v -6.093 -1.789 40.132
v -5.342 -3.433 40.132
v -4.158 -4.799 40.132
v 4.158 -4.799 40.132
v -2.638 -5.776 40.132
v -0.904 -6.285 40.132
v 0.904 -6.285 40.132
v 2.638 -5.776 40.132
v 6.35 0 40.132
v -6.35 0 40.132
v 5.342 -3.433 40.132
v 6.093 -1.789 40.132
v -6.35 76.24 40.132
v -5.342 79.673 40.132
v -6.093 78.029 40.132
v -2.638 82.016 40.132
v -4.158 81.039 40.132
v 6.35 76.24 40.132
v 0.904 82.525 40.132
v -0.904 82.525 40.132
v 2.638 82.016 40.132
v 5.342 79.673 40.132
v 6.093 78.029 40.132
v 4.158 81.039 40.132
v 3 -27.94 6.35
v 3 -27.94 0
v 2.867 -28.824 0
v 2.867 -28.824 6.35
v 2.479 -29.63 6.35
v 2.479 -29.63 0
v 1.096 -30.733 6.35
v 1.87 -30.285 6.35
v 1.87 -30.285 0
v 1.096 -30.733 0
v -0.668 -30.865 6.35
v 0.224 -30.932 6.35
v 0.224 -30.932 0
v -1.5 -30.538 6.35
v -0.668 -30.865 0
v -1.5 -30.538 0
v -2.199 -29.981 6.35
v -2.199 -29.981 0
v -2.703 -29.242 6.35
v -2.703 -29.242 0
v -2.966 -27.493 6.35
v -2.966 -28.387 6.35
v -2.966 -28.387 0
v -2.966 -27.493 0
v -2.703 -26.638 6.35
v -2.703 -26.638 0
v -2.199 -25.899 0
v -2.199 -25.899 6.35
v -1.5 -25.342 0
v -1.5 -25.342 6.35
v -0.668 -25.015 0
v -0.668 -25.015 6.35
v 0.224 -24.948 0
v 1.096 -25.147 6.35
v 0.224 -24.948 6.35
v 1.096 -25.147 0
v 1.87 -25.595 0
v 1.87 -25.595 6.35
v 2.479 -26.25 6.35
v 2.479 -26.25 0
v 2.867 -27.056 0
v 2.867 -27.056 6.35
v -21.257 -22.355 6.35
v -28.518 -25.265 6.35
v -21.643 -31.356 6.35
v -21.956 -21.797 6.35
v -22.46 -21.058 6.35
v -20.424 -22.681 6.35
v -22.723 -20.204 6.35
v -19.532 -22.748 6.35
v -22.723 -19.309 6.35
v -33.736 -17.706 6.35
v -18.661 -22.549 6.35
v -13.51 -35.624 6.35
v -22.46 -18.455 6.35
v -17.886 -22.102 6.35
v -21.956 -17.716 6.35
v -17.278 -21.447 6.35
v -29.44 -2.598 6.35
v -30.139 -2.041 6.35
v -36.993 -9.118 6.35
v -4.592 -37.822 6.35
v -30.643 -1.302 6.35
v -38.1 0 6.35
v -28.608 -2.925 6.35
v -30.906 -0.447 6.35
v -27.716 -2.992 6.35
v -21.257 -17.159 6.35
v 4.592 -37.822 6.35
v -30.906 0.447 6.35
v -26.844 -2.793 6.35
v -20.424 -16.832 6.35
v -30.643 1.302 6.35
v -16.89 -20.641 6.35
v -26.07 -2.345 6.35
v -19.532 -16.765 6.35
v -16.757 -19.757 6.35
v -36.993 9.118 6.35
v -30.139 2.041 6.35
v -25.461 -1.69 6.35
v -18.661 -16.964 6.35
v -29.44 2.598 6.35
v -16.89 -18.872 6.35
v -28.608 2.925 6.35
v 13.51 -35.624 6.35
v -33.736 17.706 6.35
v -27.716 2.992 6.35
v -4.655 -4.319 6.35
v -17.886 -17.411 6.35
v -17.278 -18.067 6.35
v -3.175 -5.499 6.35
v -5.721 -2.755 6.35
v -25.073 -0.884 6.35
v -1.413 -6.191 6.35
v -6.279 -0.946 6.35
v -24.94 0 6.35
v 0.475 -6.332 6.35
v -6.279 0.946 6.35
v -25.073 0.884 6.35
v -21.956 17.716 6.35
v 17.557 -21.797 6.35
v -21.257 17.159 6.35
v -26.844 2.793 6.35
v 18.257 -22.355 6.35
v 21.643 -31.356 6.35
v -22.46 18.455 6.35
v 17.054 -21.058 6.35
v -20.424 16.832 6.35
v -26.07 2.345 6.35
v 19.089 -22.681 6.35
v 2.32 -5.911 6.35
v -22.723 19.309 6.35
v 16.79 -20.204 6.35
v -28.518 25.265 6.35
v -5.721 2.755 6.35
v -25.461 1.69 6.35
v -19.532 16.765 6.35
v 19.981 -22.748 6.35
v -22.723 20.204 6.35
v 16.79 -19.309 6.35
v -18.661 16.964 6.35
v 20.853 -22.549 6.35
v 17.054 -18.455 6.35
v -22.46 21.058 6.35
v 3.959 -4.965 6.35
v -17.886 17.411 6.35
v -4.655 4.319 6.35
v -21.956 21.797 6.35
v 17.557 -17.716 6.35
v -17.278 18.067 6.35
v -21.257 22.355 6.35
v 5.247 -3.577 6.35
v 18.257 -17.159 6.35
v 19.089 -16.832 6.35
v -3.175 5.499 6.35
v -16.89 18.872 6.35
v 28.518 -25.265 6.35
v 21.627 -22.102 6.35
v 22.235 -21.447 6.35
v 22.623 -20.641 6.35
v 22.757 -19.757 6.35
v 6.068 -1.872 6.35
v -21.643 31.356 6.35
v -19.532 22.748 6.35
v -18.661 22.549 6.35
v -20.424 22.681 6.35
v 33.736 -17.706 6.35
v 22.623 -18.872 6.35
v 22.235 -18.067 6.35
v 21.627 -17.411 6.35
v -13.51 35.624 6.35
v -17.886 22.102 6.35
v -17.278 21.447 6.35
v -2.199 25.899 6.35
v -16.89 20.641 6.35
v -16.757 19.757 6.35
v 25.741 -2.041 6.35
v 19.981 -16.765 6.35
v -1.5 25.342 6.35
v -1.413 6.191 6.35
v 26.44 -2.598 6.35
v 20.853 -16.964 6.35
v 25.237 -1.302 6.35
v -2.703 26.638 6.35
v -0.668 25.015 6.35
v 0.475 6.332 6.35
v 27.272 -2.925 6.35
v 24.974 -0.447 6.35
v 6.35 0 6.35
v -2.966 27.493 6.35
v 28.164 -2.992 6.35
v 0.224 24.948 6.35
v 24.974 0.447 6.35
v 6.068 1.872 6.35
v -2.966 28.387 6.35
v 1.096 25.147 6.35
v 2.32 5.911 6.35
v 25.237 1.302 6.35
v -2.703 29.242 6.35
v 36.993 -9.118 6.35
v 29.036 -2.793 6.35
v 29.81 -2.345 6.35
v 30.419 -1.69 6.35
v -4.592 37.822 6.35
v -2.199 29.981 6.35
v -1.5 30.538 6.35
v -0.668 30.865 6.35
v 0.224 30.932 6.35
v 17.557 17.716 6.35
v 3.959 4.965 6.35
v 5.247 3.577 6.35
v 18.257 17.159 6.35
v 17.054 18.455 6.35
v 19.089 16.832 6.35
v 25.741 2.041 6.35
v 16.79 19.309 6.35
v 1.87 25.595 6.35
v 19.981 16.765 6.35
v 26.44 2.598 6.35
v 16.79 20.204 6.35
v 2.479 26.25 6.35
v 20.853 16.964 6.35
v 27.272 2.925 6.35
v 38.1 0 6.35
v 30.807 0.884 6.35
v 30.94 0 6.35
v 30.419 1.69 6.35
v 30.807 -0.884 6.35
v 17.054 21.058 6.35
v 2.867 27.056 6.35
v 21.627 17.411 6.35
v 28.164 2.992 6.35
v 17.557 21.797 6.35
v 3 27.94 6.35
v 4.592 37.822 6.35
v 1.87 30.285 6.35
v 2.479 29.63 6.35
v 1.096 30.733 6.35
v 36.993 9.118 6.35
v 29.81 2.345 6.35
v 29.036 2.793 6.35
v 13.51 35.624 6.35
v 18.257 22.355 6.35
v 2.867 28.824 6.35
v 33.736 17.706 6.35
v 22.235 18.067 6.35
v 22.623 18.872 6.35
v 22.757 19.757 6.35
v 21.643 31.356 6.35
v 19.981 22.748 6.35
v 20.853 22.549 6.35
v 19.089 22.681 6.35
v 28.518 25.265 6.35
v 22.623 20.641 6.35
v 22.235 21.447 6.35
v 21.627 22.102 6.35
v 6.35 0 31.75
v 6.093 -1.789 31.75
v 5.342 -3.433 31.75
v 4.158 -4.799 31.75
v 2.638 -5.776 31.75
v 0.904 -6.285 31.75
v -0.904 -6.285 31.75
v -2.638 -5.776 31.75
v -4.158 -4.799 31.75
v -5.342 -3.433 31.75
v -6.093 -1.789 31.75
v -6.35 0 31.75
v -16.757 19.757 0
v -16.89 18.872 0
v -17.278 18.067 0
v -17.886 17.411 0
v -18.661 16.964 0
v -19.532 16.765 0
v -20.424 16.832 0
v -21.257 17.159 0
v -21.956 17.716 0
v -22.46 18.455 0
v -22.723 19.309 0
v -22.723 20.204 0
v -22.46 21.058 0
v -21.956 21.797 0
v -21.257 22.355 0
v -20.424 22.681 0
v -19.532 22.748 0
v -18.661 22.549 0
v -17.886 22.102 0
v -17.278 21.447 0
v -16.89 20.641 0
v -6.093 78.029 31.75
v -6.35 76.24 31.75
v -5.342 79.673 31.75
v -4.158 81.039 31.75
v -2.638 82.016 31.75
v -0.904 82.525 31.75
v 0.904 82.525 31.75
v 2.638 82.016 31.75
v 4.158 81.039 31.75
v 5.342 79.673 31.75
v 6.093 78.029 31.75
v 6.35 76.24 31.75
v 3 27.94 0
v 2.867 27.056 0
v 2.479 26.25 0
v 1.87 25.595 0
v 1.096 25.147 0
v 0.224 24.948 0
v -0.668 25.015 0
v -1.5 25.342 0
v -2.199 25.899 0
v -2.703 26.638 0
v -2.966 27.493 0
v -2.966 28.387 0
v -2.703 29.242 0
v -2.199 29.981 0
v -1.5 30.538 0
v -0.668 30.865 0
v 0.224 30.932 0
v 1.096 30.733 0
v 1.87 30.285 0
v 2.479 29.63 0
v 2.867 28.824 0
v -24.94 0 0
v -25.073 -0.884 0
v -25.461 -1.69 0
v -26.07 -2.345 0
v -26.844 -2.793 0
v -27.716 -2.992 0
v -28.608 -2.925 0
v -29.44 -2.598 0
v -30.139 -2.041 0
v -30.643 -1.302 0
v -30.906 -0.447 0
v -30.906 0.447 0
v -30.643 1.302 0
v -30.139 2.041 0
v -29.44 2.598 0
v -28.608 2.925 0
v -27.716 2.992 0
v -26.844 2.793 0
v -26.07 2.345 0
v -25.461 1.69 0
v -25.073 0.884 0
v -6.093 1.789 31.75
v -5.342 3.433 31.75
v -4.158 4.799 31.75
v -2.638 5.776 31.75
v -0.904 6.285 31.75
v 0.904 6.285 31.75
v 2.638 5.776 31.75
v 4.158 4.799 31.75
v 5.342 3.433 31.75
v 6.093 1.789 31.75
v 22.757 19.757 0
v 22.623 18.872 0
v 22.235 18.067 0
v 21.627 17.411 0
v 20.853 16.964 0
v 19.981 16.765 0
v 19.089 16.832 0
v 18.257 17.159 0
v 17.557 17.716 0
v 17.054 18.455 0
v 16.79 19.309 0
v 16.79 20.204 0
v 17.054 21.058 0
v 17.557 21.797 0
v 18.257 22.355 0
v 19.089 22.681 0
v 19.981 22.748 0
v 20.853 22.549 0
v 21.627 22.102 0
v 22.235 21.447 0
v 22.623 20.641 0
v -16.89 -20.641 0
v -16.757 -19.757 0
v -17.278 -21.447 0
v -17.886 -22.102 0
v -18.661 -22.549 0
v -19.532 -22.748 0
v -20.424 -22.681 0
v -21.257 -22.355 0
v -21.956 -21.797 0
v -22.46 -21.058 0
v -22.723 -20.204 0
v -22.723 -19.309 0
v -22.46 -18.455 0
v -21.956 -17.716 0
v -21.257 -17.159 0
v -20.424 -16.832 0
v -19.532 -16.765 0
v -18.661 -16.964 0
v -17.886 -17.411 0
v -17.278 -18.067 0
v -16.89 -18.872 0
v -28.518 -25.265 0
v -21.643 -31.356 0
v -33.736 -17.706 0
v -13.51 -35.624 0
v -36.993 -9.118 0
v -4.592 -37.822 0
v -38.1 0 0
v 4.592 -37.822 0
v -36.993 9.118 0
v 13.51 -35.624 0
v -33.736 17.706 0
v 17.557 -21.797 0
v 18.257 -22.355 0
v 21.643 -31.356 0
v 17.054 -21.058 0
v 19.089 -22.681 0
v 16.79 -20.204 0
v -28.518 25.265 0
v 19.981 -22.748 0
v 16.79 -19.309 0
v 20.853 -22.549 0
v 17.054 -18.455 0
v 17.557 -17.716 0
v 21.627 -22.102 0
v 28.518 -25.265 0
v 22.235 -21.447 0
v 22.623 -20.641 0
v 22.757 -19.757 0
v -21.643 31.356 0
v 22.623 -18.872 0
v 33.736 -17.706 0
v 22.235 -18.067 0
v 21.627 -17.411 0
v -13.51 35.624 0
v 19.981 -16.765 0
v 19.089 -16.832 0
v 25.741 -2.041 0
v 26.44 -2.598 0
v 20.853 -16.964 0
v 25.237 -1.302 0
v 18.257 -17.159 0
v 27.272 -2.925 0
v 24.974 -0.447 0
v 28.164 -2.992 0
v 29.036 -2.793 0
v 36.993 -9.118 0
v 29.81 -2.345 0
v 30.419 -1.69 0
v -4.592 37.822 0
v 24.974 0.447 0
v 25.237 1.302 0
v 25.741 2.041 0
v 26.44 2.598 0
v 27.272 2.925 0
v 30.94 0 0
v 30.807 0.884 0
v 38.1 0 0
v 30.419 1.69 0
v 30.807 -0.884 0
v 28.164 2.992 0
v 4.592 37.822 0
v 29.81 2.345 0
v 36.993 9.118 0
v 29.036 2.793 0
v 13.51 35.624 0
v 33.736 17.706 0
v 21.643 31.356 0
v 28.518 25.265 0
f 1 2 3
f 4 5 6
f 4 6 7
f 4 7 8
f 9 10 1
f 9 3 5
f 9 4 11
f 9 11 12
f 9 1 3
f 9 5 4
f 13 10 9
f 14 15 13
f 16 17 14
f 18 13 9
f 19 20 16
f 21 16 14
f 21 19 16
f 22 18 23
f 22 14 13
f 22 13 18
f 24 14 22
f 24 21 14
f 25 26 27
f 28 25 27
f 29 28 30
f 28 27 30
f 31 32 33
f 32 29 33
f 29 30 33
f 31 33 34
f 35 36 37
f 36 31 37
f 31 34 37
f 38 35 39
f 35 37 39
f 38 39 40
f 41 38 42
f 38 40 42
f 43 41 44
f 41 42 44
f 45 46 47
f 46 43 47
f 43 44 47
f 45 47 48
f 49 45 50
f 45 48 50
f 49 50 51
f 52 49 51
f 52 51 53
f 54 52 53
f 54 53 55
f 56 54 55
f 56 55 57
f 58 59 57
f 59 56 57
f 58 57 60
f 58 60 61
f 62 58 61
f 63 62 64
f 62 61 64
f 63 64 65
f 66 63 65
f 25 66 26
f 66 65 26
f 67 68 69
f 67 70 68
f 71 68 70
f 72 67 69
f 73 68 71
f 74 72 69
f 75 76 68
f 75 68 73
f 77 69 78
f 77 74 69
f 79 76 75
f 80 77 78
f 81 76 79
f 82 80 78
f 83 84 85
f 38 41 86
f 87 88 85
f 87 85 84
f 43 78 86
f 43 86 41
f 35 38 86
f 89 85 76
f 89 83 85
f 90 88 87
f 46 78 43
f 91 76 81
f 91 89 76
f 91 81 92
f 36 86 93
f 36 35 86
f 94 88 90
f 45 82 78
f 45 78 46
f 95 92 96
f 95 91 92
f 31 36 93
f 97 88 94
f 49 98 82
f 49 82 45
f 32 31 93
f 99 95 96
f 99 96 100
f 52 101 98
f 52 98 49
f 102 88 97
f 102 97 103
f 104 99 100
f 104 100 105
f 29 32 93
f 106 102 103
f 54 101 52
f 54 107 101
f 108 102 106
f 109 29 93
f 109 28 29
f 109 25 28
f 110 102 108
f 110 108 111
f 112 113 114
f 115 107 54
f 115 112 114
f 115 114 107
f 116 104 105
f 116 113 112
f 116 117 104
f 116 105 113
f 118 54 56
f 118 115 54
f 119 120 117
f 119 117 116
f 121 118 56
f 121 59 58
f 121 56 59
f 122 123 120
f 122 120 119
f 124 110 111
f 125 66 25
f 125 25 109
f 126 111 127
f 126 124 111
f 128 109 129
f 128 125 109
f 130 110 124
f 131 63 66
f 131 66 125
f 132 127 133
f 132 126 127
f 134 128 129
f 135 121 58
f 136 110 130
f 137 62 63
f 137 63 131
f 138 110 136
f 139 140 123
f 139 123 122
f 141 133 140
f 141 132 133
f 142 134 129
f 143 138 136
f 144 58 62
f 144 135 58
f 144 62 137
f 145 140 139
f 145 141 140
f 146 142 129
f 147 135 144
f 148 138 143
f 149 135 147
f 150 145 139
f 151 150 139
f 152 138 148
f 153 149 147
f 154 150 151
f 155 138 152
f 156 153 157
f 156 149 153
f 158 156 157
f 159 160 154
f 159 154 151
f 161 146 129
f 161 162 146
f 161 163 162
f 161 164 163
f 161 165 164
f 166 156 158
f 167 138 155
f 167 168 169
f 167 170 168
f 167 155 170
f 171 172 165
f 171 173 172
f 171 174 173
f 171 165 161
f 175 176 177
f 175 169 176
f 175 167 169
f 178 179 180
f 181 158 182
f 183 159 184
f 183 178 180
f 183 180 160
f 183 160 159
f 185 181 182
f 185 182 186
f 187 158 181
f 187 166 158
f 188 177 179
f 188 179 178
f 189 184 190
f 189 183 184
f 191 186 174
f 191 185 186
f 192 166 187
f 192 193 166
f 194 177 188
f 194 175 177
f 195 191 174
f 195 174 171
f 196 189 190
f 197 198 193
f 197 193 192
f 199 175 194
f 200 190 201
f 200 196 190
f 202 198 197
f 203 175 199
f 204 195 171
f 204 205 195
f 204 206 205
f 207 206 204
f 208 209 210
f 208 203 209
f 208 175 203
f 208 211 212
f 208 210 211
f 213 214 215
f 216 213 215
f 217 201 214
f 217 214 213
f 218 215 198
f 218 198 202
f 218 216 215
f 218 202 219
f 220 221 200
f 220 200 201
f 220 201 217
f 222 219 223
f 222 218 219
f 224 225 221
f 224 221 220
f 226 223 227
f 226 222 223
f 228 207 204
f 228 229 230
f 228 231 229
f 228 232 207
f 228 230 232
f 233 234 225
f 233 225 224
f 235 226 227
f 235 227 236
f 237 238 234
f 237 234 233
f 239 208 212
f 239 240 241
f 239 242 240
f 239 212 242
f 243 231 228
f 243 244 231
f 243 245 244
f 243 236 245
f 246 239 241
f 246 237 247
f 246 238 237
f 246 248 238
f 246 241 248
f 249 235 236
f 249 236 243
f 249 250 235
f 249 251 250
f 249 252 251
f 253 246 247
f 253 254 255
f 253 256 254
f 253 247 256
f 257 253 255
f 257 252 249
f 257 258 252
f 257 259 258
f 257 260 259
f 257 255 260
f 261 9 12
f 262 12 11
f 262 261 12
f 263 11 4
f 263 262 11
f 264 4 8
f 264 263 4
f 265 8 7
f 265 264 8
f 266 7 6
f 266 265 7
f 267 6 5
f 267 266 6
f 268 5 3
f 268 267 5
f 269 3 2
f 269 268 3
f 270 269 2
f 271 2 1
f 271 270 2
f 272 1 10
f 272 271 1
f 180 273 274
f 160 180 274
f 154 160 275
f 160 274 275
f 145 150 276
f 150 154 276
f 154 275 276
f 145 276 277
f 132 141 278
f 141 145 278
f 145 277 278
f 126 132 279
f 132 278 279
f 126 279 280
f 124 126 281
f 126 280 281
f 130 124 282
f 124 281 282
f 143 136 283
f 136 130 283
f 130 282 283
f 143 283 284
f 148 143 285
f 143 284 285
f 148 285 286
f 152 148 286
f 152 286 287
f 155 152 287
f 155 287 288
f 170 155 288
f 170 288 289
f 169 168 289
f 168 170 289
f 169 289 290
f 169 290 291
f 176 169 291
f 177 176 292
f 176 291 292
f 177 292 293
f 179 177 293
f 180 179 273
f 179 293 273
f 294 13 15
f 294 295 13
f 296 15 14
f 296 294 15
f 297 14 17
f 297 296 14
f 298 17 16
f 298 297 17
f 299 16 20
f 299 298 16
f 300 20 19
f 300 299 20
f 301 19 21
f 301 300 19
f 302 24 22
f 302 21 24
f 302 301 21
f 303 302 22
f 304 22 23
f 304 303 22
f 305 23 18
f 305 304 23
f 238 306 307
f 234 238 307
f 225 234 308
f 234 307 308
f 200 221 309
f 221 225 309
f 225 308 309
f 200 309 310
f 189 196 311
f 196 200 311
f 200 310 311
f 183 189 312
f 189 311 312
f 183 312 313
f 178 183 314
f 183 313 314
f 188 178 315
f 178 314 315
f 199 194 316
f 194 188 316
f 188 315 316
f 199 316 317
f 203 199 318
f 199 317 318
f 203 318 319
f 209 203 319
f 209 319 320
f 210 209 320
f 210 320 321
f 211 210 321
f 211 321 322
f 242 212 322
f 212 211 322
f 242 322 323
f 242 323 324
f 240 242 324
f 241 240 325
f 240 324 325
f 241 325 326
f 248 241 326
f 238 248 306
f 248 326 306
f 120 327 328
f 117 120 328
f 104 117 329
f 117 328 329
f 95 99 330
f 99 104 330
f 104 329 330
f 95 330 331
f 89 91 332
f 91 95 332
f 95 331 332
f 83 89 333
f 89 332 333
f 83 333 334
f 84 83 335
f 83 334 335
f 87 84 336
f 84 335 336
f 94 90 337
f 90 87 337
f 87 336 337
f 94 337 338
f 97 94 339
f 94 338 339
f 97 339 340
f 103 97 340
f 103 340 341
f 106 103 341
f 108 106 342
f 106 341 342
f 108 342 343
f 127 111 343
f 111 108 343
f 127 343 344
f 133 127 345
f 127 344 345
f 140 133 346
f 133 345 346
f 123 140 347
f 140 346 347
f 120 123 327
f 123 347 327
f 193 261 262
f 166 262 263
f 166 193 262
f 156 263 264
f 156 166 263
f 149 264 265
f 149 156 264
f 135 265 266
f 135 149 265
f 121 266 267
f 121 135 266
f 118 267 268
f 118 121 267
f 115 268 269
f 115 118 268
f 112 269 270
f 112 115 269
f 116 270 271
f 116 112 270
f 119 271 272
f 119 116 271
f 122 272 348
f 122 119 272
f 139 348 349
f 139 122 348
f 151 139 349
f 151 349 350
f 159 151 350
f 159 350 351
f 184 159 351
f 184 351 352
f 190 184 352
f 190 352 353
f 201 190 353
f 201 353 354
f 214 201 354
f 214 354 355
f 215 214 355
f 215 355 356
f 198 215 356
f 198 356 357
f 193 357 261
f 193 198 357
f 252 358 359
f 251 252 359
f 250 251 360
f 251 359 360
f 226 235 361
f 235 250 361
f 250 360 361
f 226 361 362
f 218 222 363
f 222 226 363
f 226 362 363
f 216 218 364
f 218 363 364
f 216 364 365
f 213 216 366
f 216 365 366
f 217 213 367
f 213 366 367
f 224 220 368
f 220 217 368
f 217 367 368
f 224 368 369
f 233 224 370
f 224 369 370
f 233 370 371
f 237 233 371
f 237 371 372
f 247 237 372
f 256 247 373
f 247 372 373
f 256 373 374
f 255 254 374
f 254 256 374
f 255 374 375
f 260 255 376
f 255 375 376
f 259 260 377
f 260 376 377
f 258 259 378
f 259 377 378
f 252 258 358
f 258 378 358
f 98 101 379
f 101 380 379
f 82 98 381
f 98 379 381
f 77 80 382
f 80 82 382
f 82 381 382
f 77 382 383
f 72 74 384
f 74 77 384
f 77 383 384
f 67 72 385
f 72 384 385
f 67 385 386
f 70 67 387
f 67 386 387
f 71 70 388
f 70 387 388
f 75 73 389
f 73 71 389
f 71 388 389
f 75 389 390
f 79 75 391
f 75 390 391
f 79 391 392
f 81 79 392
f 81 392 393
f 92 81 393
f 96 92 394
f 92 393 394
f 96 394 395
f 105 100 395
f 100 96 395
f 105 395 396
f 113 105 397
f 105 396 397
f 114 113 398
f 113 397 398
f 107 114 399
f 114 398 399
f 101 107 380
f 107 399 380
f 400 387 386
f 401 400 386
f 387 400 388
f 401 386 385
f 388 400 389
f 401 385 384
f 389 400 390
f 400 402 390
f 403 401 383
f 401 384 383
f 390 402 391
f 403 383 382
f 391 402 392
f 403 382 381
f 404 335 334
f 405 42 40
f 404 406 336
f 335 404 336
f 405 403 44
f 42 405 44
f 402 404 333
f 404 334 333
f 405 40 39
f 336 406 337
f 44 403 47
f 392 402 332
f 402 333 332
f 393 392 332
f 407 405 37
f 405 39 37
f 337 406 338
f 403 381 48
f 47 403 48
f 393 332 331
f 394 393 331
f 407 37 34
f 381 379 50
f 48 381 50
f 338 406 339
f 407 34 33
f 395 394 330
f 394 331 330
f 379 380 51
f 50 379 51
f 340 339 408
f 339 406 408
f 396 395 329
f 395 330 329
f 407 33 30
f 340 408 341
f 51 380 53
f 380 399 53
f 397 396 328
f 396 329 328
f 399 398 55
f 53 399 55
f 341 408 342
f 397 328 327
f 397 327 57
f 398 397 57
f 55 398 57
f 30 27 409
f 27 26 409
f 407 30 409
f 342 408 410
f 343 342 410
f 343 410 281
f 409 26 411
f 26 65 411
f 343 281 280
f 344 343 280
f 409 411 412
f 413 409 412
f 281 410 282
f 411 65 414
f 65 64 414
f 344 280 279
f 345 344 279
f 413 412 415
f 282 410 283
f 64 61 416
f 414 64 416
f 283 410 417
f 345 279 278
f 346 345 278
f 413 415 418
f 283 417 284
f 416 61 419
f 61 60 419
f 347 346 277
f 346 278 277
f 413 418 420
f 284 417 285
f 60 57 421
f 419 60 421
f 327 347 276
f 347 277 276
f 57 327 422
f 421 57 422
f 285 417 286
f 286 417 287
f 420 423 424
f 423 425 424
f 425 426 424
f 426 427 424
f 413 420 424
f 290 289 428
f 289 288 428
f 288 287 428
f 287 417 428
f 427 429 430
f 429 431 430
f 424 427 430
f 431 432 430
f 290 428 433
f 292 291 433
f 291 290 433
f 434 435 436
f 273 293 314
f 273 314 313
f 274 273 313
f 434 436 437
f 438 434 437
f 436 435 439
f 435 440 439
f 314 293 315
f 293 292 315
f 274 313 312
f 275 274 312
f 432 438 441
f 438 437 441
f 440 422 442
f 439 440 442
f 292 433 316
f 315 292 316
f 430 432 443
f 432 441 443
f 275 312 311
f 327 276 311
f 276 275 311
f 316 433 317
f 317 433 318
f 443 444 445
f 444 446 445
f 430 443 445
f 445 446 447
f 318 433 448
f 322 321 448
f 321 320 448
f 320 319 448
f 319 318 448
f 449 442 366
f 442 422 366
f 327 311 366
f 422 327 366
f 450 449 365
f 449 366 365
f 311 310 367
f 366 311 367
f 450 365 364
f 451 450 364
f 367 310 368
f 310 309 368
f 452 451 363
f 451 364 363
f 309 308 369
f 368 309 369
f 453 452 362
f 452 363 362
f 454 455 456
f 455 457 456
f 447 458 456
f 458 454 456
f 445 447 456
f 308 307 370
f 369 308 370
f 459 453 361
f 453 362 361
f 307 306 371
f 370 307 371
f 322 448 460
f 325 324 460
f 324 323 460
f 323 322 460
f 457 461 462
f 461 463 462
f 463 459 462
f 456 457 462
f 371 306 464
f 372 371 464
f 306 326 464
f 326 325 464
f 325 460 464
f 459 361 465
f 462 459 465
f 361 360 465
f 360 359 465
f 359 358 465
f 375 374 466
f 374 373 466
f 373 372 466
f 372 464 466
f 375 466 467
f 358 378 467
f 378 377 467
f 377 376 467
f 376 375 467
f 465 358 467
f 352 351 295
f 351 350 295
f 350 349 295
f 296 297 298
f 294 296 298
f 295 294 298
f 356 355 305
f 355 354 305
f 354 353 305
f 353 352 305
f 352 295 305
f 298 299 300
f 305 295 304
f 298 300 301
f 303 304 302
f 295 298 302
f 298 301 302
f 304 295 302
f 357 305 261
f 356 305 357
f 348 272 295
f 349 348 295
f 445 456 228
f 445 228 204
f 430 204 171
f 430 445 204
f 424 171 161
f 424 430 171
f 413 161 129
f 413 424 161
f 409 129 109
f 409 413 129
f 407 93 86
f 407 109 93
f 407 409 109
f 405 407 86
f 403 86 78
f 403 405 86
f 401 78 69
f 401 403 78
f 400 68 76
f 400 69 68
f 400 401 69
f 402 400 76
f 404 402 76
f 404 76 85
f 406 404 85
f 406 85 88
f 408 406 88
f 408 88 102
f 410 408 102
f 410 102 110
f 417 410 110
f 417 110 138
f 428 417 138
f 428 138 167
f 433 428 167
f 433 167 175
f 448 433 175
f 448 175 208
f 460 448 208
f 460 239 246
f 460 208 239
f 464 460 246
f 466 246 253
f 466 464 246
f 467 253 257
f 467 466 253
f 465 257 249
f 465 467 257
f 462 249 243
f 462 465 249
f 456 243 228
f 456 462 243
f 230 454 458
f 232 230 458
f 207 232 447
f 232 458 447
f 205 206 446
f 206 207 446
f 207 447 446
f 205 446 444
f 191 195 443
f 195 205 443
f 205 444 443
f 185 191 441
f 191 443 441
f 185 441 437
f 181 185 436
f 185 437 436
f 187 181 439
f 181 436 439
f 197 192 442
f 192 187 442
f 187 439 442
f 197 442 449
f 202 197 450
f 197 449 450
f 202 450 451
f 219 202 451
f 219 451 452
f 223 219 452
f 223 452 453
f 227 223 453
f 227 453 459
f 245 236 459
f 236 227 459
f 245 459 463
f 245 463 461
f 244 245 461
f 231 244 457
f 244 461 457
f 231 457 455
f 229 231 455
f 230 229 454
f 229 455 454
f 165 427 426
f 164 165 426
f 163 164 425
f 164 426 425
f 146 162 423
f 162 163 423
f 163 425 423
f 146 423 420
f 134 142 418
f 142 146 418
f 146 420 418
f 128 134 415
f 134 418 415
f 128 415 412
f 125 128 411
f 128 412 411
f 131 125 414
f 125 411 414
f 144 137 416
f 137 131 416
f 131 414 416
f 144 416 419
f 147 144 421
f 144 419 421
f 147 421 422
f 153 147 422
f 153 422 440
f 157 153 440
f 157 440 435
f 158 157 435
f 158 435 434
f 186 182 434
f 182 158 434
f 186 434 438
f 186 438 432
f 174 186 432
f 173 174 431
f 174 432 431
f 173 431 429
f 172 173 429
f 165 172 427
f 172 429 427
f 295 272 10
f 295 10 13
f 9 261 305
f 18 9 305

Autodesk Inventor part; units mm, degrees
ref_plane "YZ Plane" through (0, 0, 0) normal (1, 0, 0) x (0, 1, 0)
ref_plane "XZ Plane" through (0, 0, 0) normal (0, 1, 0) x (-1, 0, 0)
ref_plane "XY Plane" through (0, 0, 0) normal (0, 0, 1) x (1, 0, 0)
sketch "Sketch1" plane through (0, 0, 0) normal (0, 0, 1) x (1, 0, 0)
  circle A0 centre (0, 0) radius 38.1
  circle A1 centre (0, 0) radius 27.94 construction
  circle A2 centre (0, 27.94) radius 3
  circle A3 centre (0, 0) radius 27.94 construction
  circle A4 centre (-19.7566, 19.7566) radius 3
  circle A5 centre (0, 0) radius 27.94 construction
  circle A6 centre (-27.94, 0) radius 3
  circle A7 centre (0, 0) radius 27.94 construction
  circle A8 centre (-19.7566, -19.7566) radius 3
  circle A9 centre (0, 0) radius 27.94 construction
  circle A10 centre (0, -27.94) radius 3
  circle A11 centre (0, 0) radius 27.94 construction
  circle A12 centre (19.7566, -19.7566) radius 3
  circle A13 centre (0, 0) radius 27.94 construction
  circle A14 centre (27.94, 0) radius 3
  circle A15 centre (0, 0) radius 27.94 construction
  circle A16 centre (19.7566, 19.7566) radius 3
  dimension "d1" = 55.88
  dimension "d0" = 76.2
  dimension "d2" = 6
  dimension "d5" = 360
extrude "Extrusion1" add sketch "Sketch1" along normal blind 6.35
sketch "Sketch2" plane through (0, 0, 6.35) normal (0, 0, 1) x (1, 0, 0)
  circle A0 centre (0, 0) radius 6.35
  dimension "d9" = 12.7
extrude "Extrusion2" add sketch "Sketch2" along normal blind 25.4
sketch "Sketch3" plane through (0, 0, 31.75) normal (0, 0, 1) x (1, 0, 0)
  arc A0 (-6.35, 0) -> (6.35, 0) centre (0, 0) ccw
  line L0 (6.35, 0) -> (6.35, 76.2397)
  line L1 (-6.35, 0) -> (-6.35, 76.2397)
  arc A1 (6.35, 76.2397) -> (-6.35, 76.2397) centre (0, 76.2397) ccw
extrude "Extrusion3" add sketch "Sketch3" along normal blind 8.382
properties part number "pin holder"
